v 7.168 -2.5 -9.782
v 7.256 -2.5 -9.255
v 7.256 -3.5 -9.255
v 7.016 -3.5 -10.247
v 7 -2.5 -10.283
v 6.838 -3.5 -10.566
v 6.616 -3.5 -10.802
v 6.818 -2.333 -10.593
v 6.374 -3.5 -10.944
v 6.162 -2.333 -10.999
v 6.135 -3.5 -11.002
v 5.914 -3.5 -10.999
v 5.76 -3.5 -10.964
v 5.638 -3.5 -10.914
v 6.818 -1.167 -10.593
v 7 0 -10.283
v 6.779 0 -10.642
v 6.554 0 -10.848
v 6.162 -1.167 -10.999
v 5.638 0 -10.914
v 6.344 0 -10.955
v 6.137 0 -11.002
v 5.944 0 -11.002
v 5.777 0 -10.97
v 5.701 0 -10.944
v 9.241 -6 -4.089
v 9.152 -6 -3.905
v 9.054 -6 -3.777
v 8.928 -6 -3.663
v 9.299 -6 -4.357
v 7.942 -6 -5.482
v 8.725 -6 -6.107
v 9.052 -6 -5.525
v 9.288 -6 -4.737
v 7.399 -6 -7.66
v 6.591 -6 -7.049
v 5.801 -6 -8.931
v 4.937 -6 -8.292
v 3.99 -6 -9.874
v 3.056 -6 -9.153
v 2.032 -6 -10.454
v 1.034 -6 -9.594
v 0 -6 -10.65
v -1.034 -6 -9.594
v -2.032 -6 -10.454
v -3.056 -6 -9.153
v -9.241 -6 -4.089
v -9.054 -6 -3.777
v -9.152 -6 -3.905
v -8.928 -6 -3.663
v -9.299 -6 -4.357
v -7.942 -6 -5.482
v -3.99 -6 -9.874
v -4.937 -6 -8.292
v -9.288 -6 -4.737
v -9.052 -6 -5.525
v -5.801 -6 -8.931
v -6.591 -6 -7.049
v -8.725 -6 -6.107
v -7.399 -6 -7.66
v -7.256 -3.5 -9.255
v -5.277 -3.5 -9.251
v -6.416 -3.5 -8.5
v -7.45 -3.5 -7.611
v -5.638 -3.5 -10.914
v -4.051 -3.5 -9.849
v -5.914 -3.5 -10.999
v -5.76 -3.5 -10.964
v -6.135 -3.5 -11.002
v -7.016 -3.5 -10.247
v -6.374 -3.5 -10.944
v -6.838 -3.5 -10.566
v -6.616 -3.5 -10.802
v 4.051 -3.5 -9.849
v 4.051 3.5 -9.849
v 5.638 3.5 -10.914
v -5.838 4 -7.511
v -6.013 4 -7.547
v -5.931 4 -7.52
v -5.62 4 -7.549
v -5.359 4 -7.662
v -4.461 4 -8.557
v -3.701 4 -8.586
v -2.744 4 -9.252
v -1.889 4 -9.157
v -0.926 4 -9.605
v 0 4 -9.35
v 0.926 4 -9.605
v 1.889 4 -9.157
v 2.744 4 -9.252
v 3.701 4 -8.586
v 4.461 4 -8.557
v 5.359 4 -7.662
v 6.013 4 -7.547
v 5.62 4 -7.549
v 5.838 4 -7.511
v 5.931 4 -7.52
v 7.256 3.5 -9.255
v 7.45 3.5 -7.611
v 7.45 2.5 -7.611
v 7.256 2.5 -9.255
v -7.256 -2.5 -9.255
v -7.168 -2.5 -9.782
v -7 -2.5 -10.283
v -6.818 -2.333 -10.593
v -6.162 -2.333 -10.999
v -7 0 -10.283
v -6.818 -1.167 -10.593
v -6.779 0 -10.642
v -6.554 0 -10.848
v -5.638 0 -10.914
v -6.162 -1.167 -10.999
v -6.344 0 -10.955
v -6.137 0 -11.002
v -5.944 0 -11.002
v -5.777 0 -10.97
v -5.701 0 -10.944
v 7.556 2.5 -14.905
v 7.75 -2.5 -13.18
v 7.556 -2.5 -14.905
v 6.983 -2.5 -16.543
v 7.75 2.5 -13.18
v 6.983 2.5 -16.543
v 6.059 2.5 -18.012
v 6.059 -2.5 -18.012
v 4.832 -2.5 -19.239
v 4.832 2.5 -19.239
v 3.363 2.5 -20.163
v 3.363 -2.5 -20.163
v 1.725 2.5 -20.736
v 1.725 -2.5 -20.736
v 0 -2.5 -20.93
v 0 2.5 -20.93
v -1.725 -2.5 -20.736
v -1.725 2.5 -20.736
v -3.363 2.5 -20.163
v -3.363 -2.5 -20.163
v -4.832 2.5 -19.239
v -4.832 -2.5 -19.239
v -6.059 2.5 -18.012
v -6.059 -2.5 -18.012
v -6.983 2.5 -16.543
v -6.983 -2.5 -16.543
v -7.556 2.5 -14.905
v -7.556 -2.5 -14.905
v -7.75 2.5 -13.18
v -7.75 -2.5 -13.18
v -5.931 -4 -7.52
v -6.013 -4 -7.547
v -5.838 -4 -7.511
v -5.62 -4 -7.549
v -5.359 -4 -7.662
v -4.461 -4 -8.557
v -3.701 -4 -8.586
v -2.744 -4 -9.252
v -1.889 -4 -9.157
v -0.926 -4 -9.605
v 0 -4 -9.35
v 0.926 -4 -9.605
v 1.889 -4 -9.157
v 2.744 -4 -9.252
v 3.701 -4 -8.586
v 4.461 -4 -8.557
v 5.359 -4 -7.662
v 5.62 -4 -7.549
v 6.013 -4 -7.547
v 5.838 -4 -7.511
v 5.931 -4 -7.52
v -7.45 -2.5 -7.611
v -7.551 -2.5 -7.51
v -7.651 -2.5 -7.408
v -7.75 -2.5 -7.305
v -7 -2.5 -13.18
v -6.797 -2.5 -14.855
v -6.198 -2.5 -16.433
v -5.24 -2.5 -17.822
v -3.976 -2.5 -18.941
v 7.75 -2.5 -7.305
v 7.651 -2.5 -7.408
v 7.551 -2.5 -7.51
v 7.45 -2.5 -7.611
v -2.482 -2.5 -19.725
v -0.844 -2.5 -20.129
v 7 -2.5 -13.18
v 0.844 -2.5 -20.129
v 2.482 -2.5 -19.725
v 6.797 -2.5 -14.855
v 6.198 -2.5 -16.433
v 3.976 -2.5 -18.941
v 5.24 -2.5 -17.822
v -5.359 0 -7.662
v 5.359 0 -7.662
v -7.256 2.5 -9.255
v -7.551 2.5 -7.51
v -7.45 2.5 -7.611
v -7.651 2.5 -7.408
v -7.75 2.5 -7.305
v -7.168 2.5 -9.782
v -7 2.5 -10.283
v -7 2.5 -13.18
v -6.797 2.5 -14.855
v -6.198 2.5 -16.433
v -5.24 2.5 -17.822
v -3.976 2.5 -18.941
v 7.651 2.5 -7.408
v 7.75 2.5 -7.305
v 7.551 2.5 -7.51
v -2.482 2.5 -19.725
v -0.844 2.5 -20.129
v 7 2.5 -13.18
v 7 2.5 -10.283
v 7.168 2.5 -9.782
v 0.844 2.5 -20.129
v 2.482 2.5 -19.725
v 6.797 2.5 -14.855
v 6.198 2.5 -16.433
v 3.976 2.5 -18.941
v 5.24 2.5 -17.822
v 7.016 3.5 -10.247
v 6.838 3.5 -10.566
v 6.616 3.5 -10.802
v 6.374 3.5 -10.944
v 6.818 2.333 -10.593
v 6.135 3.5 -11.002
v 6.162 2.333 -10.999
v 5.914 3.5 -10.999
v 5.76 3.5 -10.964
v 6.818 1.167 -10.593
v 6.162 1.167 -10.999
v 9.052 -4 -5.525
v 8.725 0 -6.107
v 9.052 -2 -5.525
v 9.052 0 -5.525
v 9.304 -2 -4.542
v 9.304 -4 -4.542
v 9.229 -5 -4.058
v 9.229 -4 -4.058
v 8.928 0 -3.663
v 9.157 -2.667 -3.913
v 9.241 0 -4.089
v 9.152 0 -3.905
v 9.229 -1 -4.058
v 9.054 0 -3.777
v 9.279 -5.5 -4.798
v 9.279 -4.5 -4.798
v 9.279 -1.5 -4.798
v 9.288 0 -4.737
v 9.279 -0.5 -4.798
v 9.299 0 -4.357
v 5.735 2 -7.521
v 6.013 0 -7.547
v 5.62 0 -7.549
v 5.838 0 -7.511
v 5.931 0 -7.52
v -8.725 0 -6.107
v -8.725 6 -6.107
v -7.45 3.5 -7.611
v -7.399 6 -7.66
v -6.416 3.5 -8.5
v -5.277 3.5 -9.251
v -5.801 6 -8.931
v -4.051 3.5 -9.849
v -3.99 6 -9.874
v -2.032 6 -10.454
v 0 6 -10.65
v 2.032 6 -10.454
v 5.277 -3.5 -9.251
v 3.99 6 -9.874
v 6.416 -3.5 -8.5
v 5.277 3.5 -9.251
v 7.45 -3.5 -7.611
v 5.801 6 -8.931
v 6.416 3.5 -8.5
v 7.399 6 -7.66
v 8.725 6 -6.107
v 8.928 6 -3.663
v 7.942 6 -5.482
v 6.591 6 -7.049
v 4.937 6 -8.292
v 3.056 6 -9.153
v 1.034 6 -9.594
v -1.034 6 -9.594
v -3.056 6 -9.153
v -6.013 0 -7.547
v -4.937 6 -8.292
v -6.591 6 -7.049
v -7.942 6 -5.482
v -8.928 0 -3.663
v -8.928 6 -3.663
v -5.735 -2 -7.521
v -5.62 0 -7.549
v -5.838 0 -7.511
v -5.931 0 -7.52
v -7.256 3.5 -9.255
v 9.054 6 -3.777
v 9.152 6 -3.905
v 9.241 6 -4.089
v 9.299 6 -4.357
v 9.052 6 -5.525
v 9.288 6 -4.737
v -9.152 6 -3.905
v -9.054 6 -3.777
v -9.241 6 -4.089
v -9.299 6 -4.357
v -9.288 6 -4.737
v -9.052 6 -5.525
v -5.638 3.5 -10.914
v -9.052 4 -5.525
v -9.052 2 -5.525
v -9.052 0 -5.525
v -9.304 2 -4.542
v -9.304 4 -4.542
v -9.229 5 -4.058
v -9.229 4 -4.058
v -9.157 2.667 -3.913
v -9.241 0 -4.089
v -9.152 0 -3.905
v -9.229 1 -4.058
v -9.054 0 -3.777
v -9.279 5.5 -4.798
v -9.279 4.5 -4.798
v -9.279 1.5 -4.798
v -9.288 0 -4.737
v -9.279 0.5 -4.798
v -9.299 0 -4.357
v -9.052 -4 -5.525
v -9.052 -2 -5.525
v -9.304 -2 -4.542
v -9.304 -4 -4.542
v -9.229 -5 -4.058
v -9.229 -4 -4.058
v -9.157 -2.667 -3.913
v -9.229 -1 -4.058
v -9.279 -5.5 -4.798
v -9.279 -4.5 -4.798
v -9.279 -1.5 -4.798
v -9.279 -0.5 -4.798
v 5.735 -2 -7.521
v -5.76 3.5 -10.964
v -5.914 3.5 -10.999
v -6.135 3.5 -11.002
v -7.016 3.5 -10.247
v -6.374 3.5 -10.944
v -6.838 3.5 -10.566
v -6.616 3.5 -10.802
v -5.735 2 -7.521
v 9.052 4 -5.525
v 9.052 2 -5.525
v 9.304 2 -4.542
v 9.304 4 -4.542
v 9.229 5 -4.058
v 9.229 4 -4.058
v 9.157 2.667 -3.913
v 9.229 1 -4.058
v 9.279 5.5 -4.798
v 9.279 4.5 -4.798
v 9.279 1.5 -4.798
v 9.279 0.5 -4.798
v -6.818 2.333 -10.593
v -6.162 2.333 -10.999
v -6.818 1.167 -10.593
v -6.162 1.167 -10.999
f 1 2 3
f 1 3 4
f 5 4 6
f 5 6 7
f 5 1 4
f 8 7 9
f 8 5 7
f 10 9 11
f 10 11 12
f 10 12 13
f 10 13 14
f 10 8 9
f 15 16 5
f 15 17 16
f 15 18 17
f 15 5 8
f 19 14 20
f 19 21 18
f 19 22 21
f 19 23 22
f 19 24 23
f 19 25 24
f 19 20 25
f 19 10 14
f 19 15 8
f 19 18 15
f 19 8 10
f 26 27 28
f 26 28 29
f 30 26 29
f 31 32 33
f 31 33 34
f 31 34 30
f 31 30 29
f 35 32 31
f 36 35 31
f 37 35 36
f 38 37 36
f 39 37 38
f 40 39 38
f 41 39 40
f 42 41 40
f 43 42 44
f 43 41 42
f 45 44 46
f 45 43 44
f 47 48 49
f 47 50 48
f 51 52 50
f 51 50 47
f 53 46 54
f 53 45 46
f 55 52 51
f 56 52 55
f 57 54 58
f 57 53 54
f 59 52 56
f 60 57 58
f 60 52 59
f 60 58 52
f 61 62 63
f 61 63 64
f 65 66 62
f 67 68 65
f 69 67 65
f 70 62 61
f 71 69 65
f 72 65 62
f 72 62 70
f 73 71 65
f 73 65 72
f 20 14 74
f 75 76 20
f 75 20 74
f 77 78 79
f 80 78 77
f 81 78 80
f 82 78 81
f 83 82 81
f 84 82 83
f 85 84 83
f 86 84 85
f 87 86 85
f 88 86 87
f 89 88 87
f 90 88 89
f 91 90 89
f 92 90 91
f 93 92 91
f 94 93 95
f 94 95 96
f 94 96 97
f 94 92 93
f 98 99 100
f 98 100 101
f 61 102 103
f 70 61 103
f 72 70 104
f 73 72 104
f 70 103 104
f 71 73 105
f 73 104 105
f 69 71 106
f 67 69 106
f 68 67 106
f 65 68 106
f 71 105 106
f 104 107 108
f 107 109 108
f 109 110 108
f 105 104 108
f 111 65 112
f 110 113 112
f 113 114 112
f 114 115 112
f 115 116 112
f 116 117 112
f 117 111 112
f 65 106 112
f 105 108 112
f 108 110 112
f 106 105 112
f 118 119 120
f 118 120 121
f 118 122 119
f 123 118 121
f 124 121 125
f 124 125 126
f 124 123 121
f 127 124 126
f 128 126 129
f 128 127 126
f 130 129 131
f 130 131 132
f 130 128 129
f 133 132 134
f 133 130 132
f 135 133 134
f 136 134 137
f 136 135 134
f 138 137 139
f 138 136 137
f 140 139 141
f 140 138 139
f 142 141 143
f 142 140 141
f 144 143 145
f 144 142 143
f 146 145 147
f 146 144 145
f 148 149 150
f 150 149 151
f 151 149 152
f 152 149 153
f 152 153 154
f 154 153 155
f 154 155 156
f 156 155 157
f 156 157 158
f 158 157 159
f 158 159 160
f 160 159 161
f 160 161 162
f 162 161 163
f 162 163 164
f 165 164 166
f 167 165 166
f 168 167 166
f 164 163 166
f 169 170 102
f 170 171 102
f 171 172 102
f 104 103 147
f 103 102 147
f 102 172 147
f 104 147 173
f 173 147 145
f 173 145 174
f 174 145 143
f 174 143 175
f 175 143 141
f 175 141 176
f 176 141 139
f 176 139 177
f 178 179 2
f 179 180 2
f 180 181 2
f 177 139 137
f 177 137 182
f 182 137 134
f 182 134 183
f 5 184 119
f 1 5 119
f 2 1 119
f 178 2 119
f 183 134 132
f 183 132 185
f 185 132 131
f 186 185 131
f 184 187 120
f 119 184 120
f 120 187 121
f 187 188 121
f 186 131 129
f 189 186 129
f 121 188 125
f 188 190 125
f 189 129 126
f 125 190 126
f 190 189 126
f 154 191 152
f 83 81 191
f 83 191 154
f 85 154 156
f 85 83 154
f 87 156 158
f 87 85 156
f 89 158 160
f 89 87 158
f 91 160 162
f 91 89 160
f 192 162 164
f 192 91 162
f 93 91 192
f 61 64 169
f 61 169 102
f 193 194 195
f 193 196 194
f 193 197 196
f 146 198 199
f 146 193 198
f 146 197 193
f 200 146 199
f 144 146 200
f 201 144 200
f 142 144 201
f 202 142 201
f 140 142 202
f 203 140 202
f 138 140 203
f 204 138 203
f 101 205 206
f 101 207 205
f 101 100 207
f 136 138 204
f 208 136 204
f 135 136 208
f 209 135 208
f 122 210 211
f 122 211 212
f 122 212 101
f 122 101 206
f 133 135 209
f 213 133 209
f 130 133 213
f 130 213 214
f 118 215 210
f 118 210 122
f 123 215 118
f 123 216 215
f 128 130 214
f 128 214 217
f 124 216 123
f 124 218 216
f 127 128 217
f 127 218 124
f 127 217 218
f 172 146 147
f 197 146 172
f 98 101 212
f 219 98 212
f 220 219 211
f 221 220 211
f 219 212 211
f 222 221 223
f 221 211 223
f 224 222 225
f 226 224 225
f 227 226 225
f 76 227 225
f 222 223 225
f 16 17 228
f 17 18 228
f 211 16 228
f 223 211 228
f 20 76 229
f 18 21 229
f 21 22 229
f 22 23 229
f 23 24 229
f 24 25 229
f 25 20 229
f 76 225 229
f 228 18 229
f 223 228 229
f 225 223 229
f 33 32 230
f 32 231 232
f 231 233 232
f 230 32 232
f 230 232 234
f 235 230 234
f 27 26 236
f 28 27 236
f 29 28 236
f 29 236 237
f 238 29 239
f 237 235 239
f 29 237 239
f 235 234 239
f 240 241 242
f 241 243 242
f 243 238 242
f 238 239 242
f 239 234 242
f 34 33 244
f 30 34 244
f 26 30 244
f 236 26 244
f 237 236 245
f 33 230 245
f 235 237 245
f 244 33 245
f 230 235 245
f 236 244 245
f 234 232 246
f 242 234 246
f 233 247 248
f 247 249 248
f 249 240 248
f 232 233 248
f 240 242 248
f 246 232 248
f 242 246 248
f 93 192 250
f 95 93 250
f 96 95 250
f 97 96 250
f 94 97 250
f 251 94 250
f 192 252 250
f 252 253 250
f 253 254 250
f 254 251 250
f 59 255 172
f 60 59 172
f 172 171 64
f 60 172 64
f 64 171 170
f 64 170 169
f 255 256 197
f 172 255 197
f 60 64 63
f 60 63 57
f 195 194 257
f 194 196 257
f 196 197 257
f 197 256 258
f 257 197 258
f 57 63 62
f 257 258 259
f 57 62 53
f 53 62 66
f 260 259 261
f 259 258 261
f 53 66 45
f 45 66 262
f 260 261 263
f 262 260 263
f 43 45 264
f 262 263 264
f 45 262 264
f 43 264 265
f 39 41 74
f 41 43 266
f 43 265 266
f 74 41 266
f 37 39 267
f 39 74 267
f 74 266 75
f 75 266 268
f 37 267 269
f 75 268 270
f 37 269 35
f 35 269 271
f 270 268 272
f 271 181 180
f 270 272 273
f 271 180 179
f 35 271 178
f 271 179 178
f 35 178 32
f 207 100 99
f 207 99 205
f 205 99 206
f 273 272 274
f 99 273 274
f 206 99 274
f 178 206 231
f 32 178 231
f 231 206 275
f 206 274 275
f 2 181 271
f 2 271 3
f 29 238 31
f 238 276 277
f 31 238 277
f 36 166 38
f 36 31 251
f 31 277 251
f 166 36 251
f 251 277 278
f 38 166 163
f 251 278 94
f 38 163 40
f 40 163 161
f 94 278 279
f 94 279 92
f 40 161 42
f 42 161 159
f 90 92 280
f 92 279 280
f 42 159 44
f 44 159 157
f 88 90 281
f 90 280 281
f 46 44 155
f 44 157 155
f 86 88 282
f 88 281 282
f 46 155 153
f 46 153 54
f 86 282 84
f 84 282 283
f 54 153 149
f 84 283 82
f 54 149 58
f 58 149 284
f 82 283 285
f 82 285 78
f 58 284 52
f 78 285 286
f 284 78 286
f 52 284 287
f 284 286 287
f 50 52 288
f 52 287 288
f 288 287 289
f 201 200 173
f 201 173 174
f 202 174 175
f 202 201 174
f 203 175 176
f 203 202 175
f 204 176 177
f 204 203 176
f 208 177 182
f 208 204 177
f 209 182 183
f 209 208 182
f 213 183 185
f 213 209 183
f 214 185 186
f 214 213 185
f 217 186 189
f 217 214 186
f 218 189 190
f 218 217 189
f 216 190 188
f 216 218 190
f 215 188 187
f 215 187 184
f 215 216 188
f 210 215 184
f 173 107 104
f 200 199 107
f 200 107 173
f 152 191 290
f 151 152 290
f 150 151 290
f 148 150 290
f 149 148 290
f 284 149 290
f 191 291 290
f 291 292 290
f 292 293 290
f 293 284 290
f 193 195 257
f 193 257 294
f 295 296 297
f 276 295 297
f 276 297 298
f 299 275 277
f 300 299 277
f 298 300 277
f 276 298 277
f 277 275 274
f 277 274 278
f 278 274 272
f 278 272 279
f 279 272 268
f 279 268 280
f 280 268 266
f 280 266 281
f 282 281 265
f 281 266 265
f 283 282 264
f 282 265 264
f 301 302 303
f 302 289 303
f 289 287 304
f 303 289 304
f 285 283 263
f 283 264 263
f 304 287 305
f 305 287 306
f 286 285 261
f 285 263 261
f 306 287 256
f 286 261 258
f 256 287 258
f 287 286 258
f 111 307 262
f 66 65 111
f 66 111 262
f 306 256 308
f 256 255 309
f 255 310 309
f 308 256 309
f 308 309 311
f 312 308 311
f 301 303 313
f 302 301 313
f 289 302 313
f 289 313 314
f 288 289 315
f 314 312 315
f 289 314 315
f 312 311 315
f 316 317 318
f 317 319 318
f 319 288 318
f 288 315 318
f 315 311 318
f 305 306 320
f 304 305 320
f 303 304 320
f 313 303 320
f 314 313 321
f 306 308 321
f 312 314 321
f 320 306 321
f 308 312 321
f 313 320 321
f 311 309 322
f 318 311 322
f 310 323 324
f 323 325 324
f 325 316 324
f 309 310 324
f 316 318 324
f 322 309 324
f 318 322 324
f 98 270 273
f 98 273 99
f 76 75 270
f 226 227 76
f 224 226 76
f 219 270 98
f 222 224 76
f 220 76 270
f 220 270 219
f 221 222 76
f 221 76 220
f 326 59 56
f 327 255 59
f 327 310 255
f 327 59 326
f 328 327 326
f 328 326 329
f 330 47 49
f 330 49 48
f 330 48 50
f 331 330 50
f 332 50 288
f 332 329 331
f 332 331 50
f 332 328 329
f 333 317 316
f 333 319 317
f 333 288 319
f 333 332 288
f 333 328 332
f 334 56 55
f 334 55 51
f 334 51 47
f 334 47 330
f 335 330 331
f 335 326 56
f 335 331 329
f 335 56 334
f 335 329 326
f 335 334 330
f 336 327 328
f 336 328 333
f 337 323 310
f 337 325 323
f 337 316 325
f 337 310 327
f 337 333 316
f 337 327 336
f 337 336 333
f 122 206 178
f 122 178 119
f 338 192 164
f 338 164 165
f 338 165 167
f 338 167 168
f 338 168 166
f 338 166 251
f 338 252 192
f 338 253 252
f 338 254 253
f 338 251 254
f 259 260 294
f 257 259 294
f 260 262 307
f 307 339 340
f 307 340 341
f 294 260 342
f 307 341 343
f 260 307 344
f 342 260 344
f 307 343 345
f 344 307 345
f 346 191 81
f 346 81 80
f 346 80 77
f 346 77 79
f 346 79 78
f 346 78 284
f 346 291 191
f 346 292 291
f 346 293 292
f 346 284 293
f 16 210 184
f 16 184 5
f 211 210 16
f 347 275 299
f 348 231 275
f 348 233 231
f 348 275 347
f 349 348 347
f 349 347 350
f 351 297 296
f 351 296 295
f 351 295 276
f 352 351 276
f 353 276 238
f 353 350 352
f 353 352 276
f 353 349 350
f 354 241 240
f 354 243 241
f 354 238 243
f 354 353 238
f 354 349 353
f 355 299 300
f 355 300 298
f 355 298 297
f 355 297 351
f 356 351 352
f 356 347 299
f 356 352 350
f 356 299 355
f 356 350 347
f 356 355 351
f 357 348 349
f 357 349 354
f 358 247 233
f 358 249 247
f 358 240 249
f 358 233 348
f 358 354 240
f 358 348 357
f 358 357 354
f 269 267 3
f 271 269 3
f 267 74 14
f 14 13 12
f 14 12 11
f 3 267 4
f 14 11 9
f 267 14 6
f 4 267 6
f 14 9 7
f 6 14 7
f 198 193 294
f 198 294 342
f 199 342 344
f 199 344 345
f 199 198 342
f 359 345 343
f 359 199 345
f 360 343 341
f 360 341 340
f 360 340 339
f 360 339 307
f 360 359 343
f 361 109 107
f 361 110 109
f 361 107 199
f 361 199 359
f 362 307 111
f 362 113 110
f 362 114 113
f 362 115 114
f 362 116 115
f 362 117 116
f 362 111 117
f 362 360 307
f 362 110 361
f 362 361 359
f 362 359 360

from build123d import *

# Parameters (mm, degrees)
BOSS_EXTRUDE1_DEPTH = 6
BOSS_EXTRUDE2_DEPTH = 2.5
BOSS_EXTRUDE3_DEPTH = 3.5
BOSS_EXTRUDE4_DEPTH = 4


with BuildPart() as part:
    # Sketch1 → Boss-Extrude1 (new, symmetric)
    with BuildSketch(Plane(origin=(0, 0, 0), x_dir=(1, 0, 0), z_dir=(0, 1, 0))):
        with BuildLine():
            ThreePointArc((8.92789337, 3.662679343), (0, 9.65), (-8.92789337, 3.662679343))
            add(Edge.make_bspline(
                [(-8.724914389, 6.107239058), (-8.904858788, 5.893861034), (-9.803458989, 4.322571827), (-8.92789337, 3.662679343)],
                knots=[0, 0, 0, 0, 1, 1, 1, 1], degree=3))
            ThreePointArc((-8.724914389, 6.107239058), (0, 10.65), (8.724914389, 6.107239058))
            add(Edge.make_bspline(
                [(8.724914389, 6.107239058), (8.904858788, 5.893861034), (9.803458989, 4.322571827), (8.92789337, 3.662679343)],
                knots=[0, 0, 0, 0, 1, 1, 1, 1], degree=3))
        make_face()
    extrude(amount=BOSS_EXTRUDE1_DEPTH, both=True)

    # Sketch2 → Boss-Extrude2 (add, symmetric)
    with BuildSketch(Plane(origin=(0, 0, 0), x_dir=(1, 0, 0), z_dir=(0, 1, 0))):
        with BuildLine():
            Line((-7.75, 13.180055627), (-7.75, 6.976773921))
            Line((-7.75, 6.976773921), (-7, 6.976773921))
            Line((-7, 6.976773921), (-7, 13.180055627))
            ThreePointArc((-7, 13.180055627), (0, 20.180055627), (7, 13.180055627))
            Line((7, 13.180055627), (7, 6.976773921))
            Line((7, 6.976773921), (7.75, 6.976773921))
            Line((7.75, 6.976773921), (7.75, 13.180055627))
            ThreePointArc((7.75, 13.180055627), (0, 20.930055627), (-7.75, 13.180055627))
        make_face()
    extrude(amount=BOSS_EXTRUDE2_DEPTH, both=True)

    # Sketch3 → Boss-Extrude3 (add, symmetric)
    with BuildSketch(Plane(origin=(0, 0, 0), x_dir=(1, 0, 0), z_dir=(0, 1, 0))):
        with BuildLine():
            add(Edge.make_bspline(
                [(-7.25611922, 9.254992682), (-7.041583851, 11.20624294), (-5.98153876, 11.097373504), (-5.637887905, 10.914088424)],
                knots=[0, 0, 0, 0, 1, 1, 1, 1], degree=3))
            Line((-5.637887905, 10.914088424), (-4.051396134, 9.849298928))
            ThreePointArc((-4.051396134, 9.849298928), (-5.858619381, 8.893766297), (-7.449979396, 7.610539205))
            Line((-7.449979396, 7.610539205), (-7.25611922, 9.254992682))
        make_face()
        with BuildLine():
            Line((7.449979396, 7.610539205), (7.25611922, 9.254992682))
            add(Edge.make_bspline(
                [(7.25611922, 9.254992682), (7.041583851, 11.20624294), (5.98153876, 11.097373504), (5.637887905, 10.914088424)],
                knots=[0, 0, 0, 0, 1, 1, 1, 1], degree=3))
            Line((5.637887905, 10.914088424), (4.051396134, 9.849298928))
            ThreePointArc((4.051396134, 9.849298928), (5.858619381, 8.893766297), (7.449979396, 7.610539205))
        make_face()
    extrude(amount=BOSS_EXTRUDE3_DEPTH, both=True)

    # Sketch4 → Boss-Extrude4 (add, symmetric)
    with BuildSketch(Plane(origin=(0, 0, 0), x_dir=(1, 0, 0), z_dir=(0, 1, 0))):
        with BuildLine():
            ThreePointArc((6.013295106, 7.547369208), (0, 9.65), (-6.013295106, 7.547369208))
            add(Edge.make_bspline(
                [(-5.359344629, 7.661587639), (-5.783257591, 7.437743582), (-6.013295106, 7.547369208)],
                knots=[0, 0, 0, 1, 1, 1], degree=2))
            ThreePointArc((-5.359344629, 7.661587639), (0, 9.35), (5.359344629, 7.661587639))
            add(Edge.make_bspline(
                [(5.359344629, 7.661587639), (5.783257591, 7.437743582), (6.013295106, 7.547369208)],
                knots=[0, 0, 0, 1, 1, 1], degree=2))
        make_face()
    extrude(amount=BOSS_EXTRUDE4_DEPTH, both=True)


solid = part.part
